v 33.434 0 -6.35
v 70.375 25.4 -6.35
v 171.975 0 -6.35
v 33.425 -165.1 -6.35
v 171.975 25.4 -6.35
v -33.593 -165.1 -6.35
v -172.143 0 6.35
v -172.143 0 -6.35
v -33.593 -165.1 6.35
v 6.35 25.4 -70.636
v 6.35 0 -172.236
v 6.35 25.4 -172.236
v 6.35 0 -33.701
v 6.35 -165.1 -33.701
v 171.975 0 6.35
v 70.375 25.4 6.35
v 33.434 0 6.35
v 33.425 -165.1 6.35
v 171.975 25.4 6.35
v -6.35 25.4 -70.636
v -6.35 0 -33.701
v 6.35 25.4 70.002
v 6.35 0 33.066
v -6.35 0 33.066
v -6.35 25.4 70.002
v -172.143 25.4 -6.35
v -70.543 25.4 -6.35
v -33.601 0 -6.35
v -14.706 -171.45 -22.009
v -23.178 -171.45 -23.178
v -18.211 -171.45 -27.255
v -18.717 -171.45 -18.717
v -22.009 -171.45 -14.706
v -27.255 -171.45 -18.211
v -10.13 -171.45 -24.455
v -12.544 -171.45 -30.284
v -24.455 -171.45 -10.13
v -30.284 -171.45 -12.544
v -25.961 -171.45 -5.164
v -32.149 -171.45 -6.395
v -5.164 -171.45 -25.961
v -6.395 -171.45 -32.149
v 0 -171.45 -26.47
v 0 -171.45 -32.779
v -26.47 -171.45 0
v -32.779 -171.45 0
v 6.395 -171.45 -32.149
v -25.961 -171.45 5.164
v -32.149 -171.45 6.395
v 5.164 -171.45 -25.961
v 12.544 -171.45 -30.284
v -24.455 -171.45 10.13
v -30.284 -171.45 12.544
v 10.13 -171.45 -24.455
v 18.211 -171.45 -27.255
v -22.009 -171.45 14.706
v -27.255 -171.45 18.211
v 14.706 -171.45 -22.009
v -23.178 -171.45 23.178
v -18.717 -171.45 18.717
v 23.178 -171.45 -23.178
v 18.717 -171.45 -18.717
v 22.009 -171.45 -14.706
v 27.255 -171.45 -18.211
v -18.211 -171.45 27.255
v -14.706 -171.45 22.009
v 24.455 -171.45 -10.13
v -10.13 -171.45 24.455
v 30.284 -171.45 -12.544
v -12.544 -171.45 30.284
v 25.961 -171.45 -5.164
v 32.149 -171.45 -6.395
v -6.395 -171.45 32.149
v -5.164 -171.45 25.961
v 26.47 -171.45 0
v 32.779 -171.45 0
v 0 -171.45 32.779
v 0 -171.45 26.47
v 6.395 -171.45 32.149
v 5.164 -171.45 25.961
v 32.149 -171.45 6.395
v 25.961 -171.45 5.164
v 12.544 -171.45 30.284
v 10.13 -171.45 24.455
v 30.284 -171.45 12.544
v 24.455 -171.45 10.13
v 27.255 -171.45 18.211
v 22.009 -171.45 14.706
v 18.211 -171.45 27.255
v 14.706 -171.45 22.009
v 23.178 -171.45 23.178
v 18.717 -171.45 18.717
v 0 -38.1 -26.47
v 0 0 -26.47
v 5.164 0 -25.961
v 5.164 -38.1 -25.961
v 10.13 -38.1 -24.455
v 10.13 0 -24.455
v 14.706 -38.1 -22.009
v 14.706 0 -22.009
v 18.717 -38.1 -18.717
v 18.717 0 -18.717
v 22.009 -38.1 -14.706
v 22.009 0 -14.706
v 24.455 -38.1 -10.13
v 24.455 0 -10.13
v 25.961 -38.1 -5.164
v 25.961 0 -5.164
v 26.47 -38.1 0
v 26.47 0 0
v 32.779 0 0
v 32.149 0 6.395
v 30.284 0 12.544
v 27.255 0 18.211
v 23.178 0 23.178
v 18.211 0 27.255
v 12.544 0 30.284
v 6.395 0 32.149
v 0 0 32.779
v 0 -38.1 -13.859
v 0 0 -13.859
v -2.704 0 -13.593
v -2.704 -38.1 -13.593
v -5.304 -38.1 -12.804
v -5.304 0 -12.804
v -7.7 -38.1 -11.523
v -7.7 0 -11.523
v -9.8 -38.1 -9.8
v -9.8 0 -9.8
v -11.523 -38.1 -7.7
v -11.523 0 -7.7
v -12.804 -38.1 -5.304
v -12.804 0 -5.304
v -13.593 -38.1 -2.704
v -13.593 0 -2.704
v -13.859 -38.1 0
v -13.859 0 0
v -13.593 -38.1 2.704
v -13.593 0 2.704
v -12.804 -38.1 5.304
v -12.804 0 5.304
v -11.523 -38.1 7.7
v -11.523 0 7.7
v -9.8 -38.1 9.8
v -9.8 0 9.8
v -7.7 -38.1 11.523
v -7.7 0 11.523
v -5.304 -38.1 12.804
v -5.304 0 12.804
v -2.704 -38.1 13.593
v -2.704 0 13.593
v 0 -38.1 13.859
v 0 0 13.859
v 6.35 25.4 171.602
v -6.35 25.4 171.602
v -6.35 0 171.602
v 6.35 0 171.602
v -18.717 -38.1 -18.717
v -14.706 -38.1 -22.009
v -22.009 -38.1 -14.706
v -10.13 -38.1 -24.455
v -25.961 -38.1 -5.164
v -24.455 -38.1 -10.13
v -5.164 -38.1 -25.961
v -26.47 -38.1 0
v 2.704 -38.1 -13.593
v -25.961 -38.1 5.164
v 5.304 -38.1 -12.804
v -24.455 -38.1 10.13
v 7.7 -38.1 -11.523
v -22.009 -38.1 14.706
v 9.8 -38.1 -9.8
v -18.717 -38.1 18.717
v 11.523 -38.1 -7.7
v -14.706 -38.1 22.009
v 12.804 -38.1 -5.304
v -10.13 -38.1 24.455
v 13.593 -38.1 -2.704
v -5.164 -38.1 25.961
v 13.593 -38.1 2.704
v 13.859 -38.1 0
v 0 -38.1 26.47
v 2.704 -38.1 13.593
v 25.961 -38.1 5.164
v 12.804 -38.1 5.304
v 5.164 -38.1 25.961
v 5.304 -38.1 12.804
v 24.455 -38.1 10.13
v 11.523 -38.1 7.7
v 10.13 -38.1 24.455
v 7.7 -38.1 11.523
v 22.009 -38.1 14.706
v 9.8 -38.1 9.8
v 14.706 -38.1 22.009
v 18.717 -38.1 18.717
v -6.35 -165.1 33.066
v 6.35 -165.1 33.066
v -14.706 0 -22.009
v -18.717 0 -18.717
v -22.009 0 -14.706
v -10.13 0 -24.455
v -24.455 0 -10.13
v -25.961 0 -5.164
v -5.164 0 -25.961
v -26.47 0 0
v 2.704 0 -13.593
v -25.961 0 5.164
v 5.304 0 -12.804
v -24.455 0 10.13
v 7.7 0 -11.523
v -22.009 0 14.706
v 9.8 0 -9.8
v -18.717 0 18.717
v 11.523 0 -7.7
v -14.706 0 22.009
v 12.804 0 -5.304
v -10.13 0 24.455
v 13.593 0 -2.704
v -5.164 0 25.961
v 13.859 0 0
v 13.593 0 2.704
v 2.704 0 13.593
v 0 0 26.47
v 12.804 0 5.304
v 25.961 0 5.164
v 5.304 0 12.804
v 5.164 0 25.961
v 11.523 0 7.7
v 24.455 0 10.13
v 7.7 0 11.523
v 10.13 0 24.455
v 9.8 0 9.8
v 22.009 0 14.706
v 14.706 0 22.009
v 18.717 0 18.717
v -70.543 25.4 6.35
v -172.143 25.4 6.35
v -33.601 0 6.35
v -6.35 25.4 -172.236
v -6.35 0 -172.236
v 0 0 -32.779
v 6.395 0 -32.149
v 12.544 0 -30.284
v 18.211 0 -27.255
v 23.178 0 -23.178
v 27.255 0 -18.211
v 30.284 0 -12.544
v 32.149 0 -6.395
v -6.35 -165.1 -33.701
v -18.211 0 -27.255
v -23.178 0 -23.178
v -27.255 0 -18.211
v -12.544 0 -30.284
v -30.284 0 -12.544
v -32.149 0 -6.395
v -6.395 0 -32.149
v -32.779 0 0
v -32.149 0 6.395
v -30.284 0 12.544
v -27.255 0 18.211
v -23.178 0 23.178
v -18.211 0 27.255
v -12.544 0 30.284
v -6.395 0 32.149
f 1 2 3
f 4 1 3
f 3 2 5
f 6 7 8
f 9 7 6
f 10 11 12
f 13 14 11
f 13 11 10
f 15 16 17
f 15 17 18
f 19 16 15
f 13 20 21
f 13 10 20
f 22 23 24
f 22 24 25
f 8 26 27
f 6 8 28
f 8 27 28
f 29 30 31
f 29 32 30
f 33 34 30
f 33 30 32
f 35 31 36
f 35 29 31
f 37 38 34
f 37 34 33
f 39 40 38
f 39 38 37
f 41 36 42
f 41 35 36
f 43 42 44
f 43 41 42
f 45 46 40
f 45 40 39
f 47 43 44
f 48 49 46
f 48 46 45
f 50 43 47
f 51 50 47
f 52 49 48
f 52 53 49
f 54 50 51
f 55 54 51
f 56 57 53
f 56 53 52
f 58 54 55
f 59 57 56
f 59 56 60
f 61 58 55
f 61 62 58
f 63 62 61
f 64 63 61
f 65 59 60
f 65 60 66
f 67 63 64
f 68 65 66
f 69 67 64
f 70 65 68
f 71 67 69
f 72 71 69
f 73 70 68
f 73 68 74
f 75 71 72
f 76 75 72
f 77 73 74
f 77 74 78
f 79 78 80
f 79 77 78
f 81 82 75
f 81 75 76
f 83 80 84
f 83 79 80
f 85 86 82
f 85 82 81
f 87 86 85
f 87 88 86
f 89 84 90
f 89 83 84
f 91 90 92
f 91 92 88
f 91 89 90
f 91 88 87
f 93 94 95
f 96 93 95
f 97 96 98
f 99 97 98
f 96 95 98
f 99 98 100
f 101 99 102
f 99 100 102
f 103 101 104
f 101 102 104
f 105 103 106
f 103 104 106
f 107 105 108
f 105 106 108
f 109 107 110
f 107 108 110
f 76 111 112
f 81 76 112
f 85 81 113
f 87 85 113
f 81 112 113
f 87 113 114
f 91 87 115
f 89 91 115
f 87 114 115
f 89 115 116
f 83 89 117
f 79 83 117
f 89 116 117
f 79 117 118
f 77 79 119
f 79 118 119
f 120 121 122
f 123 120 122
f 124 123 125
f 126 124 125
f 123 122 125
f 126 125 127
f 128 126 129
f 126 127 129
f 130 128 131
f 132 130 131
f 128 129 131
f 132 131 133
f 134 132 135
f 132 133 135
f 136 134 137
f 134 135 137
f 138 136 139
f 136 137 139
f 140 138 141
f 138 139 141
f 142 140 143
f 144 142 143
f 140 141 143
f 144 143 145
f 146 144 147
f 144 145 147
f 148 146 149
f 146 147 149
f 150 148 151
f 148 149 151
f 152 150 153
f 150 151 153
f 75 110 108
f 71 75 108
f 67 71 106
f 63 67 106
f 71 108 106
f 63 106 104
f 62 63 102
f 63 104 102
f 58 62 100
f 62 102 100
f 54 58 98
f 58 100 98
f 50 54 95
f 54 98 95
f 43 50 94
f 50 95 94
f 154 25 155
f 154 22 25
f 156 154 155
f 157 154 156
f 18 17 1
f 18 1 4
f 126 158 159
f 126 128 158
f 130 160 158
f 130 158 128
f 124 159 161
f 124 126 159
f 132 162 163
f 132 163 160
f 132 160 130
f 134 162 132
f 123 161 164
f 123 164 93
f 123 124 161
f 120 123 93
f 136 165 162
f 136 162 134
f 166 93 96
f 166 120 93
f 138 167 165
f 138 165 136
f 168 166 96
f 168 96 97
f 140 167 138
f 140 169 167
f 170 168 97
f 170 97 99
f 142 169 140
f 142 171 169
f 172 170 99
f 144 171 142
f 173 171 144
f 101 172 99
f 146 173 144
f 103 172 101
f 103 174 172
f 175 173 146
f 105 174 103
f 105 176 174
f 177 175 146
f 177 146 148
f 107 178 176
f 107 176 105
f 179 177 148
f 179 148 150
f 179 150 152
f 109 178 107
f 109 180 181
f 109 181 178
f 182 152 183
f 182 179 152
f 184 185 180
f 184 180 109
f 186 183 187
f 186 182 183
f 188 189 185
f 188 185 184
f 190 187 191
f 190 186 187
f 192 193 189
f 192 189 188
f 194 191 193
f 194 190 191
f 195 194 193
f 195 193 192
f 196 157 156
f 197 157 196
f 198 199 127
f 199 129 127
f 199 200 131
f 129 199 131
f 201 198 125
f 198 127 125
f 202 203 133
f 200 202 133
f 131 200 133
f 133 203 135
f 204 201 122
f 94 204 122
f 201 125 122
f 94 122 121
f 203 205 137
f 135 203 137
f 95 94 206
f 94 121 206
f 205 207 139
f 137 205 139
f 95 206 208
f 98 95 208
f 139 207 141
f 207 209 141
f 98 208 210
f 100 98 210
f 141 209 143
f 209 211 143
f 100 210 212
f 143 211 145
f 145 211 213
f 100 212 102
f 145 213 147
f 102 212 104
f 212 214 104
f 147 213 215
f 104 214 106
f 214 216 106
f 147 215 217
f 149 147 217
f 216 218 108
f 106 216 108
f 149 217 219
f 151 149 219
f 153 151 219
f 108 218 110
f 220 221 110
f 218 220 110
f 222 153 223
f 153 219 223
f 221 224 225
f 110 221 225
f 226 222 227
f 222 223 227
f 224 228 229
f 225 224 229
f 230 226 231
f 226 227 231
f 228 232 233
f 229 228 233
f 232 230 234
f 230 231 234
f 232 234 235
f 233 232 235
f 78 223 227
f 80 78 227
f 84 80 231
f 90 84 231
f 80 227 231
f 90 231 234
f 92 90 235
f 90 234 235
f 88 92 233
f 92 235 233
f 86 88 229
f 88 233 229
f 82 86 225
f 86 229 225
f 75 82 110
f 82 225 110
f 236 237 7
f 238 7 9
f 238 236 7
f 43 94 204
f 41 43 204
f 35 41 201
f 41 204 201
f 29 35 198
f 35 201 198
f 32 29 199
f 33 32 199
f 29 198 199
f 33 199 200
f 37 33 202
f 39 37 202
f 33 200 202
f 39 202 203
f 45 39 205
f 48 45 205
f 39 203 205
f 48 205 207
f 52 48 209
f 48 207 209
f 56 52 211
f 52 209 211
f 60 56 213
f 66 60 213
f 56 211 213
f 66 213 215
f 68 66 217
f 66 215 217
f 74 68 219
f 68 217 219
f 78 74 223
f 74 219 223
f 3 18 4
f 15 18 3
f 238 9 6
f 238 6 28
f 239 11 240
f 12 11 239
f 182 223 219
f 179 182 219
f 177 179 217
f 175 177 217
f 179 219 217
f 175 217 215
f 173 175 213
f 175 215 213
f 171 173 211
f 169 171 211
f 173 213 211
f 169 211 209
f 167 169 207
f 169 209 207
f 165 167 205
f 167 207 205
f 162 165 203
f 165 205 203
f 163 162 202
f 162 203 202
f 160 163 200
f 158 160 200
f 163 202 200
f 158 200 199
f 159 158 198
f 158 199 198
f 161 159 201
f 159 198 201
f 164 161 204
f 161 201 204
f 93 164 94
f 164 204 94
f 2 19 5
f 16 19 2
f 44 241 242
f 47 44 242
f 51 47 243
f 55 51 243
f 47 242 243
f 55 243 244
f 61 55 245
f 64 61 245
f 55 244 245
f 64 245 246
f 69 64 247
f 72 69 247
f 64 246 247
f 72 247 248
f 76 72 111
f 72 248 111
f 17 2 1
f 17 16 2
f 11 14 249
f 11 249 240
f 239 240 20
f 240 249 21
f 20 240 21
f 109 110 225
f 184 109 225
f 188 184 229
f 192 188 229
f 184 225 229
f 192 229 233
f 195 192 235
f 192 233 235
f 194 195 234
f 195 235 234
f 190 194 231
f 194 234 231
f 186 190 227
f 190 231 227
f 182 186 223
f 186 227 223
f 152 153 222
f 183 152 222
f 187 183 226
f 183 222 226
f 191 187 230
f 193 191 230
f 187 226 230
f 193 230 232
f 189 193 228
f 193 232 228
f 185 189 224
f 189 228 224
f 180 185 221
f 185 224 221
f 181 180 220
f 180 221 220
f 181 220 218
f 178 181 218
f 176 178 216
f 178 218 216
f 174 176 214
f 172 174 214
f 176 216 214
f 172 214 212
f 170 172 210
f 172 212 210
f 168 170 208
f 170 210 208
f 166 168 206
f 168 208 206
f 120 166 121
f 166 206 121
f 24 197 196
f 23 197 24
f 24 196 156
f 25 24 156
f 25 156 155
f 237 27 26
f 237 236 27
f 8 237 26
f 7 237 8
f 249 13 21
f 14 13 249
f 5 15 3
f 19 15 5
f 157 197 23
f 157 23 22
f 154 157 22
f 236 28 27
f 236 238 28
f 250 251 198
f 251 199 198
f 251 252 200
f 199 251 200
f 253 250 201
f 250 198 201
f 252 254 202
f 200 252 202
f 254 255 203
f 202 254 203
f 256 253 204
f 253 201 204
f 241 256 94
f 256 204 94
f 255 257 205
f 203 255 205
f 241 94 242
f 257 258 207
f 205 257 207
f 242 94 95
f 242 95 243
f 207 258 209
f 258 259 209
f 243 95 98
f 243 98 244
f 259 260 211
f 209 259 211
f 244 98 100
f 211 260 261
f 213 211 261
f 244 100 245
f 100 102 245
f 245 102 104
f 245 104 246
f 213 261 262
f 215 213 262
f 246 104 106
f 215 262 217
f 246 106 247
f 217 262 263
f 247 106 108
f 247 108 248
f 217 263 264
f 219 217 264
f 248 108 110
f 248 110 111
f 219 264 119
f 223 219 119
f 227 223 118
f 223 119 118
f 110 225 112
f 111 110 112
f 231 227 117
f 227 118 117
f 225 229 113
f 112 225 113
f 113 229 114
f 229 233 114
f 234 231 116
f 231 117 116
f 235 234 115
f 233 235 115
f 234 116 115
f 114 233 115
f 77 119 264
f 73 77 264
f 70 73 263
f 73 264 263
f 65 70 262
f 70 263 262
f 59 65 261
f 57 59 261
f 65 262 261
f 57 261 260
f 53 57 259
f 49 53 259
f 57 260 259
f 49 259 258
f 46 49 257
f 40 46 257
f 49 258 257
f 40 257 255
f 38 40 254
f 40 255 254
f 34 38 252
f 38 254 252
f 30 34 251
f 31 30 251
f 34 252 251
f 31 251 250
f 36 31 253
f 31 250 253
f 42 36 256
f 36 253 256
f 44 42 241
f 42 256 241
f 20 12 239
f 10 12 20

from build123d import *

# Parameters (mm, degrees)
F1_DEPTH = 171.45
F3_DEPTH = 6.35
F5_DEPTH = 6.35
F7_DEPTH = 38.1


# Not quite as in the source:
# - a feature names something its author has since deleted; it is built from what else it names


with BuildPart() as f1:
    # F0 (on Front) → F1 (new body)
    with BuildSketch(Plane.XZ):
        with BuildLine():
            ThreePointArc((0, -32.7790447839), (23.1782848475, -23.1782848475), (32.7790447839, 0))
            ThreePointArc((32.7790447839, 0), (23.1782848475, 23.1782848475), (0, 32.7790447839))
            Line((0, 32.7790447839), (0, 26.4696761765))
            ThreePointArc((0, 26.4696761765), (18.7168875202, 18.7168875202), (26.4696761765, 0))
            ThreePointArc((26.4696761765, 0), (18.7168875202, -18.7168875202), (0, -26.4696761765))
            Line((0, -26.4696761765), (0, -32.7790447839))
        make_face()
        with BuildLine():
            Line((0, 26.4696761765), (0, 32.7790447839))
            ThreePointArc((0, 32.7790447839), (-32.7790447839, 0), (0, -32.7790447839))
            Line((0, -32.7790447839), (0, -26.4696761765))
            ThreePointArc((0, -26.4696761765), (-26.4696761765, 0), (0, 26.4696761765))
        make_face()
    extrude(amount=F1_DEPTH)


with BuildPart() as f3:
    # F2 (on Right) → F3 (new body, symmetric)
    with BuildSketch(Plane.YZ):
        Polygon((0, -33.7008051574), (-165.1, -33.7008051574), (0, -172.2361542648), (25.4, -172.2361542648), (25.4, -70.6361542648), align=None)
    extrude(amount=F3_DEPTH, both=True)


with BuildPart() as f3b:
    # F2 (on Right) → F3, piece 2 (new body, symmetric)
    with BuildSketch(Plane.YZ):
        Polygon((0, 171.6016080213), (-165.1, 33.0662589139), (0, 33.0662589139), align=None)
        Polygon((25.4, 171.6016080213), (0, 171.6016080213), (0, 33.0662589139), (25.4, 70.0016080213), align=None)
    extrude(amount=F3_DEPTH, both=True)


with BuildPart() as f5:
    # F4 (on Top) → F5 (new body, symmetric)
    with BuildSketch(Plane.XY):
        Polygon((70.3748299711, 25.4), (33.4335446524, 0), (171.9748299711, 0), (171.9748299711, 25.4), align=None)
        Polygon((33.4335446524, 0), (33.4251142079, -165.0999997848), (171.9748299711, 0), align=None)
    extrude(amount=F5_DEPTH, both=True)


with BuildPart() as f5b:
    # F4 (on Top) → F5, piece 2 (new body, symmetric)
    with BuildSketch(Plane.XY):
        Polygon((-172.14276502, 25.4), (-172.14276502, 0), (-33.6014797013, 0), (-70.54276502, 25.4), align=None)
        Polygon((-172.14276502, 0), (-33.5930492568, -165.0999997848), (-33.6014797013, 0), align=None)
    extrude(amount=F5_DEPTH, both=True)


with BuildPart() as f7:
    # F0 (on Front) → F7 (new body)
    with BuildSketch(Plane.XZ):
        with BuildLine():
            ThreePointArc((26.4696761765, 0), (18.7168875202, 18.7168875202), (0, 26.4696761765))
            Line((0, 26.4696761765), (0, 13.8590905917))
            ThreePointArc((0, 13.8590905917), (9.7998569385, 9.7998569385), (13.8590905917, 0))
            ThreePointArc((13.8590905917, 0), (9.7998569385, -9.7998569385), (0, -13.8590905917))
            Line((0, -13.8590905917), (0, -26.4696761765))
            ThreePointArc((0, -26.4696761765), (18.7168875202, -18.7168875202), (26.4696761765, 0))
        make_face()
        with BuildLine():
            Line((0, 13.8590905917), (0, 26.4696761765))
            ThreePointArc((0, 26.4696761765), (-26.4696761765, 0), (0, -26.4696761765))
            Line((0, -26.4696761765), (0, -13.8590905917))
            ThreePointArc((0, -13.8590905917), (-13.8590905917, 0), (0, 13.8590905917))
        make_face()
    extrude(amount=F7_DEPTH)


solid = Compound([f1.part, f3.part, f3b.part, f5.part, f5b.part, f7.part])
